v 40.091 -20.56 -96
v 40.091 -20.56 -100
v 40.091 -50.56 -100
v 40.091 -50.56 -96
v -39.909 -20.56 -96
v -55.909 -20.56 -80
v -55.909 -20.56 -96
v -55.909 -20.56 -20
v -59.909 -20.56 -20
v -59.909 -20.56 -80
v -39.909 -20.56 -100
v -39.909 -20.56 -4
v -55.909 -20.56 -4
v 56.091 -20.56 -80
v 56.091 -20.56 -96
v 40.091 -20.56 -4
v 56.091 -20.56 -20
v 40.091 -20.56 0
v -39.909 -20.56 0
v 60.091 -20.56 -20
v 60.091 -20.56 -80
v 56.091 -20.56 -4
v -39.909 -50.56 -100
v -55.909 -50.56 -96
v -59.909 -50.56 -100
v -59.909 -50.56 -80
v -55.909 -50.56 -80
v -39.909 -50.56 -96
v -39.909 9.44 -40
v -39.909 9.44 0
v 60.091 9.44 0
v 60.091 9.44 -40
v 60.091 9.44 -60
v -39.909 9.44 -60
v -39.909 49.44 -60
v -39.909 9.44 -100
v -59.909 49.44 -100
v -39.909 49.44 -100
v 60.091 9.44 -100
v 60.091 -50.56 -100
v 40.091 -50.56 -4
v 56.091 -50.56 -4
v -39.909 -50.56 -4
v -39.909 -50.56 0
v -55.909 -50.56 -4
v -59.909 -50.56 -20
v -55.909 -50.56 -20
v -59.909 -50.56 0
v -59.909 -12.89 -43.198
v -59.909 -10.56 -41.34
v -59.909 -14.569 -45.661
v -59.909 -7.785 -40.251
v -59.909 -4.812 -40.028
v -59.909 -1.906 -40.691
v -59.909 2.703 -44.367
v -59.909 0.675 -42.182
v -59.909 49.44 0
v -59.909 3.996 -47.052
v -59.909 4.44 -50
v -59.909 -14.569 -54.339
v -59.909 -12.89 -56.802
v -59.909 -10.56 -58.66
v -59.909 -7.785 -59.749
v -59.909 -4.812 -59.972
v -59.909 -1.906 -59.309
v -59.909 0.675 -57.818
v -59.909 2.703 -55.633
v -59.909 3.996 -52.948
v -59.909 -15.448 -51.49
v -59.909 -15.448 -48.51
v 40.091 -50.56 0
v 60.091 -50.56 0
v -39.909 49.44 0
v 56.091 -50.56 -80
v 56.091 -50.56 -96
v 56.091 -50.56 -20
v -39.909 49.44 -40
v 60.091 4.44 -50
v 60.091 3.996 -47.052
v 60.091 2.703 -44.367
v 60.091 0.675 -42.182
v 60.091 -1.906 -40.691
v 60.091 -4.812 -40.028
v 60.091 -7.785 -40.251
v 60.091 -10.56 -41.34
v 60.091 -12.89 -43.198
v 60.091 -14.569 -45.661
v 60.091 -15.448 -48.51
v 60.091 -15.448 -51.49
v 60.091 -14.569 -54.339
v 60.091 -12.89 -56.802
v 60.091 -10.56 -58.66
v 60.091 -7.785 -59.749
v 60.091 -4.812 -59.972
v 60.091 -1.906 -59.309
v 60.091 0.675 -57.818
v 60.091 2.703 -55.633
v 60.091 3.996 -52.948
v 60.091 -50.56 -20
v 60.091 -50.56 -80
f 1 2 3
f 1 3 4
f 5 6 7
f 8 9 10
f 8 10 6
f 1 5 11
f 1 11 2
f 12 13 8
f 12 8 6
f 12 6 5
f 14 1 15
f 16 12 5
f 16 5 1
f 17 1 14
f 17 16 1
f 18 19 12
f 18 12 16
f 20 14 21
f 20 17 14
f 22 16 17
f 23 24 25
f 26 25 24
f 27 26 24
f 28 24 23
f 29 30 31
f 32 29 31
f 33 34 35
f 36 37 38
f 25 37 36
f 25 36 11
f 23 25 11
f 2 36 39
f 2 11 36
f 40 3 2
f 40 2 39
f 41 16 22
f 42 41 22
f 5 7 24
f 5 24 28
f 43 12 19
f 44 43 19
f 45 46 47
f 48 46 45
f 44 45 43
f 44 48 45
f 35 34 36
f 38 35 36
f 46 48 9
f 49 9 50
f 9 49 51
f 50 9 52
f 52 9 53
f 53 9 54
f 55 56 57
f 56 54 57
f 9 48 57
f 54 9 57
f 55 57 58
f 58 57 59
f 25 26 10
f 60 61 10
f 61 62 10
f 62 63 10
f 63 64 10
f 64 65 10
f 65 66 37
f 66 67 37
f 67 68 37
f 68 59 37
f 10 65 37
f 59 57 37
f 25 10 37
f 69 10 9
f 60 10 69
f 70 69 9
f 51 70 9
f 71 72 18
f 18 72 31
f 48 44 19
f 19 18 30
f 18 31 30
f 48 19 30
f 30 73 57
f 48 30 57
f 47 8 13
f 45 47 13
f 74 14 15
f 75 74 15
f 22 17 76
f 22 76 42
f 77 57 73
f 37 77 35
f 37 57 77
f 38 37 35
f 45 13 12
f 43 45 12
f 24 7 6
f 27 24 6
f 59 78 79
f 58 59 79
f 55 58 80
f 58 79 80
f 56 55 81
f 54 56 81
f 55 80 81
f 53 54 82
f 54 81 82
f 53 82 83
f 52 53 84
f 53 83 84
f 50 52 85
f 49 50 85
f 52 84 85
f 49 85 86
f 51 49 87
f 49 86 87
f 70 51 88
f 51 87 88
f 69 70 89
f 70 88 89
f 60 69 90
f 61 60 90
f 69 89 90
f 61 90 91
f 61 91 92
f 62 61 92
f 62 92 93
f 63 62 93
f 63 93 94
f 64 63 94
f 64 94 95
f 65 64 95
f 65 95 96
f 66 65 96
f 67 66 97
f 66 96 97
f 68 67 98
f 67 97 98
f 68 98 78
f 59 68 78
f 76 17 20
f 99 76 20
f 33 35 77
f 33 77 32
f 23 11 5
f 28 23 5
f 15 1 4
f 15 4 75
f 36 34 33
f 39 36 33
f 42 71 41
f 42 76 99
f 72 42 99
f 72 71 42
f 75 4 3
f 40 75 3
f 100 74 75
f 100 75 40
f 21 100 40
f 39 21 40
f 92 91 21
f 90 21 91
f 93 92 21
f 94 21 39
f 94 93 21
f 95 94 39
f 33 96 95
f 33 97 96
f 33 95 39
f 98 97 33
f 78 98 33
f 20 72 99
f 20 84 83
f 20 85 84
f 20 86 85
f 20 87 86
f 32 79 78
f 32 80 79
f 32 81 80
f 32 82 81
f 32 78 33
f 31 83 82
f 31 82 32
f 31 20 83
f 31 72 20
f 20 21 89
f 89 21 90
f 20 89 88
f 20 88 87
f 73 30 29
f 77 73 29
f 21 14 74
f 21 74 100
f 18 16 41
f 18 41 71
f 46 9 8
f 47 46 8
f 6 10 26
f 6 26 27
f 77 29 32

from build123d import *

# Parameters (mm, degrees)
SKETCH7_W               = 120
SKETCH7_H               = 30
BOSS_EXTRUDE4_DEPTH     = 100
SKETCH8_W               = 20
SKETCH8_H               = 100
BOSS_EXTRUDE5_DEPTH     = 40
SKETCH9_W               = 100
SKETCH9_H               = 20
BOSS_EXTRUDE6_DEPTH     = 40
CUT_EXTRUDE2_DEPTH      = 99.261072461
CUT_EXTRUDE2_DEPTH_BACK = 40
SKETCH11_R              = 10
CUT_EXTRUDE3_DEPTH      = 120
SKETCH12_W              = 4
SKETCH12_H              = 16
SKETCH12_H_2            = 4
SKETCH12_W_2            = 16
SKETCH12_W_3            = 20
SKETCH12_H_3            = 20
BOSS_EXTRUDE7_DEPTH     = 30


with BuildPart() as part:
    # Sketch7 → Boss-Extrude4 (new body)
    with BuildSketch(Plane.XY):
        with Locations((0.090771558, -5.559757943)):
            Rectangle(SKETCH7_W, SKETCH7_H)
    extrude(amount=-BOSS_EXTRUDE4_DEPTH)

    # Sketch8 → Boss-Extrude5 (add)
    with BuildSketch(Plane(origin=(0, 9.440242057, 0), x_dir=(1, 0, 0), z_dir=(0, 1, 0))):
        with Locations((-49.909228442, 50)):
            Rectangle(SKETCH8_W, SKETCH8_H)
    extrude(amount=BOSS_EXTRUDE5_DEPTH)

    # Sketch9 → Boss-Extrude6 (add)
    with BuildSketch(Plane(origin=(0, 9.440242057, 0), x_dir=(1, 0, 0), z_dir=(0, 1, 0))):
        with Locations((10.090771558, 50)):
            Rectangle(SKETCH9_W, SKETCH9_H)
    extrude(amount=BOSS_EXTRUDE6_DEPTH)

    # Sketch10 → Cut-Extrude2 (cut, two sides: drawn at the far end of the back side and taken through both)
    with BuildSketch(Plane.XY.offset(-40).offset(-CUT_EXTRUDE2_DEPTH_BACK)):
        Polygon((-284.082083156, 147.109383943), (-39.909228442, 49.440242057), (60.090771558, 9.440242057), (304.263626273, -88.228899828), (499.601910045, 400.116809601), (-88.743799385, 635.455093373), align=None)
    extrude(amount=CUT_EXTRUDE2_DEPTH + CUT_EXTRUDE2_DEPTH_BACK, mode=Mode.SUBTRACT)

    # Sketch11 → Cut-Extrude3 (cut)
    with BuildSketch(Plane(origin=(60.090771558, 0, 0), x_dir=(0, 0, -1), z_dir=(1, 0, 0))):
        with Locations(Location((50, -5.559757943, 0), (0, 0, 90))):
            Circle(SKETCH11_R)
    extrude(amount=-CUT_EXTRUDE3_DEPTH, mode=Mode.SUBTRACT)

    # Sketch12 → Boss-Extrude7 (add)
    with BuildSketch(Plane.XZ.offset(20.559757943)):
        with Locations((-57.909228442, -12)):
            Rectangle(SKETCH12_W, SKETCH12_H)
        with Locations((-57.909228442, -2)):
            Rectangle(SKETCH12_W, SKETCH12_H_2)
        with Locations((-47.909228442, -2)):
            Rectangle(SKETCH12_W_2, SKETCH12_H_2)
        with Locations((48.090771558, -2)):
            Rectangle(SKETCH12_W_2, SKETCH12_H_2)
        with Locations((58.090771558, -12)):
            Rectangle(SKETCH12_W, SKETCH12_H)
        with Locations((58.090771558, -2)):
            Rectangle(SKETCH12_W, SKETCH12_H_2)
        with Locations((58.090771558, -88)):
            Rectangle(SKETCH12_W, SKETCH12_H)
        with Locations((58.090771558, -98)):
            Rectangle(SKETCH12_W, SKETCH12_H_2)
        with Locations((48.090771558, -98)):
            Rectangle(SKETCH12_W_2, SKETCH12_H_2)
        with Locations((-49.909228442, -98)):
            Rectangle(SKETCH12_W_3, SKETCH12_H_2)
        with Locations((-57.909228442, -90)):
            Rectangle(SKETCH12_W, SKETCH12_H_3)
    extrude(amount=BOSS_EXTRUDE7_DEPTH)


solid = part.part
